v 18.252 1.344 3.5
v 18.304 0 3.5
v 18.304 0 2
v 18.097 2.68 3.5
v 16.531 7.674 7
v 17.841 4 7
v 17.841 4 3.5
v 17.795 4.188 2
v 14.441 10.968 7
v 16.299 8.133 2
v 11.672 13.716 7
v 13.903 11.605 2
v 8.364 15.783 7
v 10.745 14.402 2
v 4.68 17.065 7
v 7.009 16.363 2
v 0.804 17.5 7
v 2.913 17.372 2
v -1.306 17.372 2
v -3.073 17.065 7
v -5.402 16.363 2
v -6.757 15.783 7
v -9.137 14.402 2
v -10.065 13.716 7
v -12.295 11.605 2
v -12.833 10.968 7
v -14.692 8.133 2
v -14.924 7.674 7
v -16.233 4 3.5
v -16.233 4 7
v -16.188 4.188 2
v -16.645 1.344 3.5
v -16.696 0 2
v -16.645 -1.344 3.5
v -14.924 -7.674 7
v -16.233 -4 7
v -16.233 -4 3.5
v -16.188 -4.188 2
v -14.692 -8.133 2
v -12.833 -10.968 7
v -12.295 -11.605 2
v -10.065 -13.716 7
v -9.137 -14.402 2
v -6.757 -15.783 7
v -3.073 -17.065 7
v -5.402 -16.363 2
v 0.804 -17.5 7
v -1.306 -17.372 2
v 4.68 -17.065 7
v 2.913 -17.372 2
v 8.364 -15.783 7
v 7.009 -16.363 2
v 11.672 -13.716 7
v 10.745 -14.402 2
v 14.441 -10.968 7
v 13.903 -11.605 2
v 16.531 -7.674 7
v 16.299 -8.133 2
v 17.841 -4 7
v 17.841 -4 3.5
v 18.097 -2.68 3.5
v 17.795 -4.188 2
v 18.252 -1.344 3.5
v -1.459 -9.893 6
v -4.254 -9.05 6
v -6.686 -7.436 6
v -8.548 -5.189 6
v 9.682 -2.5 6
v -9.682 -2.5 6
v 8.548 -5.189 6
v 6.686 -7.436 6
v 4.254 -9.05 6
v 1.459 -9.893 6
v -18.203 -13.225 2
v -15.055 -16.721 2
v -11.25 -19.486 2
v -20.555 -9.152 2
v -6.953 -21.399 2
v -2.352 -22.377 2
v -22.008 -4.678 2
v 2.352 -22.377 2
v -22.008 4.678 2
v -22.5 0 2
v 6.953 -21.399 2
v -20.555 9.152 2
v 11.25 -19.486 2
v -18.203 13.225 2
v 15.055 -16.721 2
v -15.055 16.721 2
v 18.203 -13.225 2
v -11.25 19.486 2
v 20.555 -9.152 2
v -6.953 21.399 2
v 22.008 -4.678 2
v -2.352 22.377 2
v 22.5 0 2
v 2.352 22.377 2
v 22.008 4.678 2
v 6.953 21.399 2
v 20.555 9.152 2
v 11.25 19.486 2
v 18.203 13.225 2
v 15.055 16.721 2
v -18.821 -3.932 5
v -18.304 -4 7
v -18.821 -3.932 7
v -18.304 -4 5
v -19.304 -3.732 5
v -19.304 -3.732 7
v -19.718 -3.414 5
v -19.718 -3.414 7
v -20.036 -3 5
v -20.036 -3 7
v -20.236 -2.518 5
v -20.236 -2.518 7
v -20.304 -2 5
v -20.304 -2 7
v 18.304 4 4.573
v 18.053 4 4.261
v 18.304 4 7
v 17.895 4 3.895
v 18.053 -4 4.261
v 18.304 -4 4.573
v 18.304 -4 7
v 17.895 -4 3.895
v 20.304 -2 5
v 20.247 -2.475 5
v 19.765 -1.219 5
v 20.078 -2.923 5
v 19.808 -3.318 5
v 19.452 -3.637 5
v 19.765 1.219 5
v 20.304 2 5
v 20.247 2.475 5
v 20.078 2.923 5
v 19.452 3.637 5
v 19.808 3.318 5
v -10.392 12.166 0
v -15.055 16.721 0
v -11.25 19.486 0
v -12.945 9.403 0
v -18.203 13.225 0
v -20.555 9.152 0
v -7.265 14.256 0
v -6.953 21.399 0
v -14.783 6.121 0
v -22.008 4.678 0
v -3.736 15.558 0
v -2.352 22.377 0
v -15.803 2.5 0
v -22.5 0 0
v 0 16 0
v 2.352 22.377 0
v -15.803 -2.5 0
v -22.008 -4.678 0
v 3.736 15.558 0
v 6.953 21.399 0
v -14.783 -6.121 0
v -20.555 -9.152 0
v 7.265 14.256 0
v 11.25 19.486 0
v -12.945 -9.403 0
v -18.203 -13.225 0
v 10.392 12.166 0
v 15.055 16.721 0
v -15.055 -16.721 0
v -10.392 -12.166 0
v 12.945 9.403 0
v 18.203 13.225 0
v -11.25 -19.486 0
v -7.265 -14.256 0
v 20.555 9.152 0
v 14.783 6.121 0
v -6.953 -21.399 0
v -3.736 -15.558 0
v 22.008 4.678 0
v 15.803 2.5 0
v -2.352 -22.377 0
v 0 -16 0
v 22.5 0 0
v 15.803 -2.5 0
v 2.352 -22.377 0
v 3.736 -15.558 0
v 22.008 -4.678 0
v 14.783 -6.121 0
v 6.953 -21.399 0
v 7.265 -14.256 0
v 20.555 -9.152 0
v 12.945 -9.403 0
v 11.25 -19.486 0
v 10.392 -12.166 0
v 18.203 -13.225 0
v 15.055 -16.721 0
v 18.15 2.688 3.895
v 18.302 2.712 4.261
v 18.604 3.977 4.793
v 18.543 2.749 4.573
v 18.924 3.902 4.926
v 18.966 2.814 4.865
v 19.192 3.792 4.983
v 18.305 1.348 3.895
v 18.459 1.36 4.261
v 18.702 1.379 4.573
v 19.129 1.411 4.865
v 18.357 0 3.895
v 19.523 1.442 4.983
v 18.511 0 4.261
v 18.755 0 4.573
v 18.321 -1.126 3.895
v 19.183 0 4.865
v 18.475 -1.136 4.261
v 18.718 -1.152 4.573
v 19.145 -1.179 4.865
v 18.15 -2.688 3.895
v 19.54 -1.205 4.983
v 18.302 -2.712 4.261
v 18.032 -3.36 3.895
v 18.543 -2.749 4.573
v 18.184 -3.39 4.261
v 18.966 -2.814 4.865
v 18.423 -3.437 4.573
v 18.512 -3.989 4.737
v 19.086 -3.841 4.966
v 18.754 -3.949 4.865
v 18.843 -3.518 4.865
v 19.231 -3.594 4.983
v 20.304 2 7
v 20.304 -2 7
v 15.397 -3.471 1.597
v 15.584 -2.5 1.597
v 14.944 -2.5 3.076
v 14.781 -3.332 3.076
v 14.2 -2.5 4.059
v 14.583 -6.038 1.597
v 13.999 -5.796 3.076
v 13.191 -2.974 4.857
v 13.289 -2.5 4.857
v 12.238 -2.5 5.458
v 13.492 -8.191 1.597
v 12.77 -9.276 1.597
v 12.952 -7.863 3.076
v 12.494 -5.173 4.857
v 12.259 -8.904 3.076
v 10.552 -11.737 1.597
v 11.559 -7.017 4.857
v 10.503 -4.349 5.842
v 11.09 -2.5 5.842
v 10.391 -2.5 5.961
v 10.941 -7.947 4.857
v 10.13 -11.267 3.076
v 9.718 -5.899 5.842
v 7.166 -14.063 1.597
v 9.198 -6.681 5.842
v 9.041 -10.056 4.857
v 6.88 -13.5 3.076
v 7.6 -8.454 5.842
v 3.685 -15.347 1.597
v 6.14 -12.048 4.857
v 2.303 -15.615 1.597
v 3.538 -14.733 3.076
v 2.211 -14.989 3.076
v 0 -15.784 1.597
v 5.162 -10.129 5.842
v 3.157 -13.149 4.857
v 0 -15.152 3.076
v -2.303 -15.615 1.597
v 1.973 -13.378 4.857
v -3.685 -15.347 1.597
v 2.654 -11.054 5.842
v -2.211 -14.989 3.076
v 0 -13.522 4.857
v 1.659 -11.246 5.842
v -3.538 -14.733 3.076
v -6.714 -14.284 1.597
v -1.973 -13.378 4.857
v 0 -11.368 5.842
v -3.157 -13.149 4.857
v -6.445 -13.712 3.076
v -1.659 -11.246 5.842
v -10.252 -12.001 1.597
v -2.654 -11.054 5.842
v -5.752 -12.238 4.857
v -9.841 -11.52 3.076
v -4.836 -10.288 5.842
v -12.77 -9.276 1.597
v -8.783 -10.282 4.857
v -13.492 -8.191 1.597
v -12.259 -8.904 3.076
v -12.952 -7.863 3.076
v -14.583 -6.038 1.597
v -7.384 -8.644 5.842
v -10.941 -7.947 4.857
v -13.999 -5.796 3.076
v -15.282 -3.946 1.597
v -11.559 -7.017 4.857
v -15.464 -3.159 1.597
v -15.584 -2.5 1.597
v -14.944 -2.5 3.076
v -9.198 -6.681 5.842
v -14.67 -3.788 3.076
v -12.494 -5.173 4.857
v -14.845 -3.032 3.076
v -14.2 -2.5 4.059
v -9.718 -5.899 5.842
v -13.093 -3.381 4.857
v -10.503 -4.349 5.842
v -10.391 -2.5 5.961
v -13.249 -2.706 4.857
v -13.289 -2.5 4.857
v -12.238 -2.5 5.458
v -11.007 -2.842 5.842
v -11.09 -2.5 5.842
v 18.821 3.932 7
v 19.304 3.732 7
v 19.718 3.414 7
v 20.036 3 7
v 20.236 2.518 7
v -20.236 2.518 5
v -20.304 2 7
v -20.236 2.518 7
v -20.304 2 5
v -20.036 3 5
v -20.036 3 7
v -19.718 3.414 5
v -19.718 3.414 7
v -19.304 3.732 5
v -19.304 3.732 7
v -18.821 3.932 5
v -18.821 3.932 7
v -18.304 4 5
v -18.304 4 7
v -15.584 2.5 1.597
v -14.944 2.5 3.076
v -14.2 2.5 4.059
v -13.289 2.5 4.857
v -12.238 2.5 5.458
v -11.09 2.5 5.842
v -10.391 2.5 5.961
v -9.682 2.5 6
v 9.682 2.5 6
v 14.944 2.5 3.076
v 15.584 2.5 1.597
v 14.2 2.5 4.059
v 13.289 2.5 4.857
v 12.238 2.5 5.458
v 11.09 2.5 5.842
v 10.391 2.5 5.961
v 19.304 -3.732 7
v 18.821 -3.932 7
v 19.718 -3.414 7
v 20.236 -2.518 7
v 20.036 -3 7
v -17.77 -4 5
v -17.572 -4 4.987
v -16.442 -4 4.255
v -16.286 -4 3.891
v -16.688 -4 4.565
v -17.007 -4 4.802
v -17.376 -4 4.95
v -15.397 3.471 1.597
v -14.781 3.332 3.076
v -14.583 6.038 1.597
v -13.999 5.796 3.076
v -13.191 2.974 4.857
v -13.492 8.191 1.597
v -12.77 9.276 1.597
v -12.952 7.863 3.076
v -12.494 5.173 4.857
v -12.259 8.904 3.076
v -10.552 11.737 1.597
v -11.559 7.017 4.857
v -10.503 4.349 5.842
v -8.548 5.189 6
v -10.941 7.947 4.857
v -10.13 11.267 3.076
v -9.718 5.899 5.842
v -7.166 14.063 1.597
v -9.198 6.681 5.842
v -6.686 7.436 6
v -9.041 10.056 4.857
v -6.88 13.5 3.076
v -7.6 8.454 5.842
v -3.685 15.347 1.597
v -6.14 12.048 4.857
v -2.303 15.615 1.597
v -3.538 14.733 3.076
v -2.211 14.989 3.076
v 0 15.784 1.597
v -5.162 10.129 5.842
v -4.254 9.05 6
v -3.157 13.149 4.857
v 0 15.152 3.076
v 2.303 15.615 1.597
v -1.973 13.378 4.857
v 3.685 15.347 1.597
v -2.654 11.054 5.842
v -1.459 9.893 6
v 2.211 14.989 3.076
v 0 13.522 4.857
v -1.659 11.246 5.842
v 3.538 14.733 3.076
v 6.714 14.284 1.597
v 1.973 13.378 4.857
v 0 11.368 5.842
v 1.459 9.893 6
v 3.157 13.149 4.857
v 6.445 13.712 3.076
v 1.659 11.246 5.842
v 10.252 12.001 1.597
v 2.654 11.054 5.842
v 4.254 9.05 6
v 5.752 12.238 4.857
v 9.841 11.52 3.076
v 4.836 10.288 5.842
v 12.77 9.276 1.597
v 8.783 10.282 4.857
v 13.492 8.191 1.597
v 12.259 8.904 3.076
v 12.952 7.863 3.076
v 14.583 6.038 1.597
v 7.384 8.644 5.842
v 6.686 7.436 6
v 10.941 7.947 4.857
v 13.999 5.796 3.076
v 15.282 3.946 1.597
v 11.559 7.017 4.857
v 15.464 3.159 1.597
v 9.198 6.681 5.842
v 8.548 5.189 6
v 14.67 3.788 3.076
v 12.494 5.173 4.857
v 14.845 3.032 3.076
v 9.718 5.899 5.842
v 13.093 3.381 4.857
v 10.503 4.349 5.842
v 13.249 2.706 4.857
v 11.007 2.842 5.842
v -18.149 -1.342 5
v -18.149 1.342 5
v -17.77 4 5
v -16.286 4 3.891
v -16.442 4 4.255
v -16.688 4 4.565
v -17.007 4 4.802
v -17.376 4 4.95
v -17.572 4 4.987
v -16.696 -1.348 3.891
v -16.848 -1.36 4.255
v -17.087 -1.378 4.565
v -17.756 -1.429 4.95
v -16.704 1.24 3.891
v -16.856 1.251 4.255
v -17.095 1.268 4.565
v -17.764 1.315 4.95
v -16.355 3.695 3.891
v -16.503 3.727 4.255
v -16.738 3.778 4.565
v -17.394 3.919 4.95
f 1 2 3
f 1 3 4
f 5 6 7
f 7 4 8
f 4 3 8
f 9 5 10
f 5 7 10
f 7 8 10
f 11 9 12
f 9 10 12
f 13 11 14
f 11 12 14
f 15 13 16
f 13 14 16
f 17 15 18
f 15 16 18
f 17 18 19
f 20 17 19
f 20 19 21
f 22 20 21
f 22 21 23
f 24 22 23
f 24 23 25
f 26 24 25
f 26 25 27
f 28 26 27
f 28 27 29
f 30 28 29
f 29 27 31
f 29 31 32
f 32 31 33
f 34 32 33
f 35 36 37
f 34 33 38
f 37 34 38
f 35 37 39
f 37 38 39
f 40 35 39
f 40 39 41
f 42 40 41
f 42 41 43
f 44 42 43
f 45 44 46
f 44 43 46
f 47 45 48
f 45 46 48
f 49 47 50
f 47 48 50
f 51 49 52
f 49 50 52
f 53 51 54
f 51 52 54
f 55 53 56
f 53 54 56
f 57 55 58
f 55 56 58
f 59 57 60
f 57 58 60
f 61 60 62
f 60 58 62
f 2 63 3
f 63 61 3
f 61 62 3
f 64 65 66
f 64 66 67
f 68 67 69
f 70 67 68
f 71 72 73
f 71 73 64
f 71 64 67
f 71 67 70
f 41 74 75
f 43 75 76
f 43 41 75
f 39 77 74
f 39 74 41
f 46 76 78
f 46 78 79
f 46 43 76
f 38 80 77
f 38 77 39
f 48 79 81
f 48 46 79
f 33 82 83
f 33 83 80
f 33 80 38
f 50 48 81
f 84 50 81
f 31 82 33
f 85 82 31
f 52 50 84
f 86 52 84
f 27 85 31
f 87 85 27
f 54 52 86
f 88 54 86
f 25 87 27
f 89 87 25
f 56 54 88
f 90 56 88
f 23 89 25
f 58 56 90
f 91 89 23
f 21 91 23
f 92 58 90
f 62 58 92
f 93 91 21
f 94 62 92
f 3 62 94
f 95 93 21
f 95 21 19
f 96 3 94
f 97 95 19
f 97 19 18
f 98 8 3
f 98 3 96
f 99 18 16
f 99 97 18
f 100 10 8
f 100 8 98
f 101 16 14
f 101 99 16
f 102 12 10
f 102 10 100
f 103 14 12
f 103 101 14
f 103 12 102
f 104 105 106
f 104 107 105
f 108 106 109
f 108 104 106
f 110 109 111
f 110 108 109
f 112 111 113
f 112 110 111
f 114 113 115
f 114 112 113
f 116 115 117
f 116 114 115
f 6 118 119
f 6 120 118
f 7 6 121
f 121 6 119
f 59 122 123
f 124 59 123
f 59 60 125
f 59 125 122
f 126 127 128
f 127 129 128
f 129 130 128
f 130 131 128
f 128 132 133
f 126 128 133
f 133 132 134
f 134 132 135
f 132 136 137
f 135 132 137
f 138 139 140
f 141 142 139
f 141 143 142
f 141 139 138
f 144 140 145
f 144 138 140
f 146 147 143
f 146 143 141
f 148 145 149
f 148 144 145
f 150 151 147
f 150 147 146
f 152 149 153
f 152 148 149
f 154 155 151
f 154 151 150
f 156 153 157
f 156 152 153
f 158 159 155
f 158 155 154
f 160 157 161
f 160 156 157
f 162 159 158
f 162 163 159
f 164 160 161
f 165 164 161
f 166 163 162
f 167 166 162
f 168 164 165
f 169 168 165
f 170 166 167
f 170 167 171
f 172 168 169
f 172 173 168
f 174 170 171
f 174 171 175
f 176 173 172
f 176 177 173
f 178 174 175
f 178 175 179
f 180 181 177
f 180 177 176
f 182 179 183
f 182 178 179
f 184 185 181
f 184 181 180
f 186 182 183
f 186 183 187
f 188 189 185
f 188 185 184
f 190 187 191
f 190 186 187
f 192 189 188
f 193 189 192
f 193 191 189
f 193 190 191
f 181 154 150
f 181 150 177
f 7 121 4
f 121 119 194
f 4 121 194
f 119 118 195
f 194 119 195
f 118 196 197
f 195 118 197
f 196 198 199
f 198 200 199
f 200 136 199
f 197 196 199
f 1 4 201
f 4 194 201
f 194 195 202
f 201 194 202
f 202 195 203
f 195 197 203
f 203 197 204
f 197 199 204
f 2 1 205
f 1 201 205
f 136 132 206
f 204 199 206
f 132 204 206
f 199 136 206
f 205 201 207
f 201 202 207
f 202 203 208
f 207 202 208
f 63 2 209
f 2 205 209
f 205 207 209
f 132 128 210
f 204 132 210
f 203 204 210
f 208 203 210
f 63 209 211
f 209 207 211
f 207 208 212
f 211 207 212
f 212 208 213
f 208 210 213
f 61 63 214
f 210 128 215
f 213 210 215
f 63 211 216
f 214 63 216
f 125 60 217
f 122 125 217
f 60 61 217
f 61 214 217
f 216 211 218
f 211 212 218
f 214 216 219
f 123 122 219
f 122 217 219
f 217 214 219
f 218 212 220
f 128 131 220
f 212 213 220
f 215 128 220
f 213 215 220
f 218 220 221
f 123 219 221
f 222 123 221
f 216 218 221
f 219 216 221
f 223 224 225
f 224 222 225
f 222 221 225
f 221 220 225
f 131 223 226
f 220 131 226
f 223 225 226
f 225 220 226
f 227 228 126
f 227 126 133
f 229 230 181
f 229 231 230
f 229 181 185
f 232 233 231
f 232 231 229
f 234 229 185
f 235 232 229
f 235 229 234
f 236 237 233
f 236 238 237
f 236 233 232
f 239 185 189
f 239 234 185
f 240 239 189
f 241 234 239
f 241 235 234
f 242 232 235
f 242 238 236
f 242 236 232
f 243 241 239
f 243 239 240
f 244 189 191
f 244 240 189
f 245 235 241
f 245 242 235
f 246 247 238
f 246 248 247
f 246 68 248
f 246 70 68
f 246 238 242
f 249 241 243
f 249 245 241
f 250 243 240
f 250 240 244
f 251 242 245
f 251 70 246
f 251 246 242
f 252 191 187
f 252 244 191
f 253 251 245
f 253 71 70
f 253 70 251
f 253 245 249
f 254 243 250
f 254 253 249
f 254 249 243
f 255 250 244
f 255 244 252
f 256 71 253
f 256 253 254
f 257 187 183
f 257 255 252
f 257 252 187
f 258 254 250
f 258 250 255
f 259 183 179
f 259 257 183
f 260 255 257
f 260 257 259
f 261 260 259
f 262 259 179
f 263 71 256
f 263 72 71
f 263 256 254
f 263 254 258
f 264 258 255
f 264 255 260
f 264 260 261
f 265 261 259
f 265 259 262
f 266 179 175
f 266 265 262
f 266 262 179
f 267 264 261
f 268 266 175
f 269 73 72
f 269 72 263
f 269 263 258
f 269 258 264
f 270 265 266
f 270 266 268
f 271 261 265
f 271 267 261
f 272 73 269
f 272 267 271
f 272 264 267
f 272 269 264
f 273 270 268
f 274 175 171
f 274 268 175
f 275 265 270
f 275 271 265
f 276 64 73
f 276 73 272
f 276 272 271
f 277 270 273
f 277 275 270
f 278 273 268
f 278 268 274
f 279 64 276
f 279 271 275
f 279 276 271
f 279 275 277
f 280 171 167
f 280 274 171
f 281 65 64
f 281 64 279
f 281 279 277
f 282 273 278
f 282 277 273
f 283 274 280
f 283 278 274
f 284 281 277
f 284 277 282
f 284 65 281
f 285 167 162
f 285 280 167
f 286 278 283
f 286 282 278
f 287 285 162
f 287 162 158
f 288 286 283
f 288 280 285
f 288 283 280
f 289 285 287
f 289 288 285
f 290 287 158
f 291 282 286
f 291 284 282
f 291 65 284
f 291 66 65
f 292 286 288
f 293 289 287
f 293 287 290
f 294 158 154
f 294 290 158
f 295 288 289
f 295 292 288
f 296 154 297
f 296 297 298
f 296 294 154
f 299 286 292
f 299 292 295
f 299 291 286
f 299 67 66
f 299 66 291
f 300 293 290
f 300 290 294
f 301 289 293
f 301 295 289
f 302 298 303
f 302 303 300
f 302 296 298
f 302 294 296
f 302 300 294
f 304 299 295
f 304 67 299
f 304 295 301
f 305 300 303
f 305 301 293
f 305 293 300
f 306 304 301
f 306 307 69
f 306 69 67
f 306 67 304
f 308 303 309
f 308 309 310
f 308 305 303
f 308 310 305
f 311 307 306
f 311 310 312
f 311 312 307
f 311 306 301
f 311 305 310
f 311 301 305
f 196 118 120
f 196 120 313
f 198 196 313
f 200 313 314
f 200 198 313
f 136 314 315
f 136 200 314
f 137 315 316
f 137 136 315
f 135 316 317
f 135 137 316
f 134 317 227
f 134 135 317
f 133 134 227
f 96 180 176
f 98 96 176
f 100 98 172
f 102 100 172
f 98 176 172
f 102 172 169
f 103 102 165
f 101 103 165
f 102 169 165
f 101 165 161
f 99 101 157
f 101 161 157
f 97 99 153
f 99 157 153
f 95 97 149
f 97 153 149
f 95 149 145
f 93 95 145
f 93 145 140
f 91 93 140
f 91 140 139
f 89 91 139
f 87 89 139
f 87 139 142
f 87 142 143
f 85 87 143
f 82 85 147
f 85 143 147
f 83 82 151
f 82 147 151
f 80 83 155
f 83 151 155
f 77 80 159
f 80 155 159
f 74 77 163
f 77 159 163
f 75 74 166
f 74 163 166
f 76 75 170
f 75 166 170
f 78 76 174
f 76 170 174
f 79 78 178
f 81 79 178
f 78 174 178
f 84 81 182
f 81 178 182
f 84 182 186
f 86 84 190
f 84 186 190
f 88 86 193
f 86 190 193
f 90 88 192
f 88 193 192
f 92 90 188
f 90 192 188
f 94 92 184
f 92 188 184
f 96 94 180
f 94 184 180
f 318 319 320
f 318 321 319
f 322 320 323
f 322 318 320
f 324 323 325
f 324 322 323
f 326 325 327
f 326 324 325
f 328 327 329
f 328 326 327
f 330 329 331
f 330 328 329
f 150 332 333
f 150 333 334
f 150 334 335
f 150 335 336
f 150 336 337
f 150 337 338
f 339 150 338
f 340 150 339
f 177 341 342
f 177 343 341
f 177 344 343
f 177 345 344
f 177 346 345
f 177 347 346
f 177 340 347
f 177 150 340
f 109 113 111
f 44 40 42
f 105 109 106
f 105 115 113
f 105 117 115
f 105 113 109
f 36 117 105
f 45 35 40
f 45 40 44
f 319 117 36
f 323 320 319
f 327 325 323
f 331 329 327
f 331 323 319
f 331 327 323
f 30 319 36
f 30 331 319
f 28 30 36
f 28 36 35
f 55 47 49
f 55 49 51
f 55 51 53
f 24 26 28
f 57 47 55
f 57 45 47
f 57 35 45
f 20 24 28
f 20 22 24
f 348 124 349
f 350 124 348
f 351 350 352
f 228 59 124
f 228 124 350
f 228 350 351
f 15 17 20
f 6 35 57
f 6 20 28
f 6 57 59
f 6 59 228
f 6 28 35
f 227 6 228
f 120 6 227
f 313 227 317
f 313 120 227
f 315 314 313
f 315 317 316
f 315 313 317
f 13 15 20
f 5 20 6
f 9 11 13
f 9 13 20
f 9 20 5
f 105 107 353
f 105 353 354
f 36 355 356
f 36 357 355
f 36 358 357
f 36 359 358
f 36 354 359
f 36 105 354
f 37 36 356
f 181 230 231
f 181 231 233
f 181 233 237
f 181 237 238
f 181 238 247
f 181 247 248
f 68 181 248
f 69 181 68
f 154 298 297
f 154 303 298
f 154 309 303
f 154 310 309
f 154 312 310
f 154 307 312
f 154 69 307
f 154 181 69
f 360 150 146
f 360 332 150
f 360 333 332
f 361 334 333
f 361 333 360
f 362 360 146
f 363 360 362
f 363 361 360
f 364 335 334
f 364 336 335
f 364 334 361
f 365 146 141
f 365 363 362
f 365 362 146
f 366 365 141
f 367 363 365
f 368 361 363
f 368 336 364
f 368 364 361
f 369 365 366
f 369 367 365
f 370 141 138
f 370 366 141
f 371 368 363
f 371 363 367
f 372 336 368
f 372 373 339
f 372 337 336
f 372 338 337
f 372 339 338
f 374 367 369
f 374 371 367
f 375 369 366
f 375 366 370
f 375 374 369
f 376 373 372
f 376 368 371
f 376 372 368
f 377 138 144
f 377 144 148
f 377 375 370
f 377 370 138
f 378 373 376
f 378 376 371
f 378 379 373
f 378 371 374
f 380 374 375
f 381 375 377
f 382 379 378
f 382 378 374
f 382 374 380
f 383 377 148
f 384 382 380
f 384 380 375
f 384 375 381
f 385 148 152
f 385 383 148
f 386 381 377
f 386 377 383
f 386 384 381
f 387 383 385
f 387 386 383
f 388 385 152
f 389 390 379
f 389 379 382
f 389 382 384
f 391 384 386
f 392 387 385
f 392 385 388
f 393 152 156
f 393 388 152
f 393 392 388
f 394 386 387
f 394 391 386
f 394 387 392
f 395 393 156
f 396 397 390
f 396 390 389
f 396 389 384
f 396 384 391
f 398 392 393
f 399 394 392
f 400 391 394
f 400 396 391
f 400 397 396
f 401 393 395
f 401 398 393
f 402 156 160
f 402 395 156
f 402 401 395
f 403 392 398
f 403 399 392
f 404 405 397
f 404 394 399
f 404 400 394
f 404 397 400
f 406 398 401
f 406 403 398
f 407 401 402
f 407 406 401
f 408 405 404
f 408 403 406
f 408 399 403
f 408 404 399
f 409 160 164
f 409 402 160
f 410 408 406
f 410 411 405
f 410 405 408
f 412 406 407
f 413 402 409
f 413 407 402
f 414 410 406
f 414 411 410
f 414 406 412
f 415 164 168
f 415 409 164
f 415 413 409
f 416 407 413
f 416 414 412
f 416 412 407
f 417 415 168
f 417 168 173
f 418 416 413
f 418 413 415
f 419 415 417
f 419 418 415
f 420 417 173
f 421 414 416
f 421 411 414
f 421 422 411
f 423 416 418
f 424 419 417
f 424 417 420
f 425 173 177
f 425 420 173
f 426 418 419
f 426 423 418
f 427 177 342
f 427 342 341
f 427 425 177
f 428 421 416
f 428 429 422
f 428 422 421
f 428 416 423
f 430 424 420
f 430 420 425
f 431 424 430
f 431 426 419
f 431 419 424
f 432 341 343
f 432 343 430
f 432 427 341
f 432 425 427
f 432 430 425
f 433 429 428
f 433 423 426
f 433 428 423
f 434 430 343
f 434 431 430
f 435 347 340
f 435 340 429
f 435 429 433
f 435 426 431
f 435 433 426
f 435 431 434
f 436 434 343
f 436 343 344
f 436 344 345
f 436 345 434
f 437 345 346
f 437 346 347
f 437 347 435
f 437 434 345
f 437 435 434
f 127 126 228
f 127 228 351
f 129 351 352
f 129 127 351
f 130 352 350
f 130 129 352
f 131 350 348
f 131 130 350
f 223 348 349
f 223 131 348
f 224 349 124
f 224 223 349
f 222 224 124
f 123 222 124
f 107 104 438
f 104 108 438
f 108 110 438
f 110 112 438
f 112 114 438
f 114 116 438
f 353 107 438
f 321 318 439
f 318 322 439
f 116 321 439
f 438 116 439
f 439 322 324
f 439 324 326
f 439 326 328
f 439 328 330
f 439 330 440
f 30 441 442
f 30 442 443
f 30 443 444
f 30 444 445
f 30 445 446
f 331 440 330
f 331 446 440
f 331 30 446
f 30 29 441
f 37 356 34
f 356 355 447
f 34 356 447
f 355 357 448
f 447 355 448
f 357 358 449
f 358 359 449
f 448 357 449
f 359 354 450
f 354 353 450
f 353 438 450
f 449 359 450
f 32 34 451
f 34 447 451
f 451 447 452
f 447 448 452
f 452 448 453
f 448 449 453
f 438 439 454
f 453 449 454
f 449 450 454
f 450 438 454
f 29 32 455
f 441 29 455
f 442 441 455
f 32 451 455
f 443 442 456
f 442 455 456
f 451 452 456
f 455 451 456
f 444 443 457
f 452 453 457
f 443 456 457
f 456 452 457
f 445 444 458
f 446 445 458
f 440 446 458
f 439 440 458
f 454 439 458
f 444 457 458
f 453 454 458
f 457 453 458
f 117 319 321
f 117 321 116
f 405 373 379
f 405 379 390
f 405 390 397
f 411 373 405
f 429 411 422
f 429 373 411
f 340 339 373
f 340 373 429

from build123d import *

# Parameters (mm, degrees)
F0_R     = 22.5
F1_DEPTH = 2
F2_R     = 17.5
F3_DEPTH = 5
F5_DEPTH = 2
F6_R     = 1.5
F7_R     = 2
F8_R     = 16
F9_DEPTH = 6
F10_R    = 5.99999


# Not quite as in the source:
# - a fillet or chamfer is up to 0.001 mm smaller than in the source, because OpenCascade refuses the exact size


with BuildPart() as f1:
    # F0 (on Top) → F1 (new body)
    with BuildSketch(Plane.XY):
        Circle(F0_R)
    extrude(amount=F1_DEPTH)

    # F2 (on face) → F3 (join)
    with BuildSketch(Plane.XY.offset(2)):
        with Locations((0.8037949441, 0)):
            Circle(F2_R)
    extrude(amount=F3_DEPTH)

    # F4 (on face) → F5 (join)
    with BuildSketch(Plane.XY.offset(7)):
        with BuildLine():
            Line((-20.3037949441, -4), (-16.2329300933, -4))
            ThreePointArc((-16.2329300933, -4), (-16.6962050559, 0), (-16.2329300933, 4))
            Line((-16.2329300933, 4), (-20.3037949441, 4))
            Line((-20.3037949441, 4), (-20.3037949441, -4))
        make_face()
        with BuildLine():
            Line((-16.2329300933, -4), (17.8405199815, -4))
            ThreePointArc((17.8405199815, -4), (18.1875903893, -2.0133692962), (18.3037949441, 0))
            ThreePointArc((18.3037949441, 0), (18.1875903893, 2.0133692962), (17.8405199815, 4))
            Line((17.8405199815, 4), (-16.2329300933, 4))
            ThreePointArc((-16.2329300933, 4), (-16.6962050559, 0), (-16.2329300933, -4))
        make_face()
        with BuildLine():
            Line((17.8405199815, -4), (20.3037949441, -4))
            Line((20.3037949441, -4), (20.3037949441, 4))
            Line((20.3037949441, 4), (17.8405199815, 4))
            ThreePointArc((17.8405199815, 4), (18.1875903893, 2.0133692962), (18.3037949441, 0))
            ThreePointArc((18.3037949441, 0), (18.1875903893, -2.0133692962), (17.8405199815, -4))
        make_face()
    extrude(amount=-F5_DEPTH)

    # F6
    f6_edges = [f1.edges().sort_by_distance(p)[0] for p in [
        (18.18759, -2.013369, 5),
        (-16.696205, 0, 5),
        (18.18759, 2.013369, 5),
    ]]
    fillet(f6_edges, radius=F6_R)

    # F7
    f7_edges = [f1.edges().sort_by_distance(p)[0] for p in [
        (-20.303795, 4, 6),
        (-20.303795, -4, 6),
        (20.303795, -4, 6),
        (20.303795, 4, 6),
    ]]
    fillet(f7_edges, radius=F7_R)

    # F8 (on face) → F9 (cut)
    with BuildSketch(Plane(origin=(0, 0, 0), x_dir=(1, 0, 0), z_dir=(0, 0, -1))):
        Circle(F8_R)
    extrude(amount=-F9_DEPTH, mode=Mode.SUBTRACT)

    # F10 (radius 6 in the source; OpenCascade refuses exactly that, so slightly less here)
    f10_edges = [f1.edges().sort_by_distance(p)[0] for p in [
        (-16, 0, 6),
    ]]
    fillet(f10_edges, radius=F10_R)

    # F11 (on face) → F12 (join, up to the next surface of F1)
    with BuildSketch(Plane(origin=(0, 0, 0), x_dir=(1, 0, 0), z_dir=(0, 0, -1))):
        with BuildLine():
            Line((15.8034806293, 2.5), (-15.8034806293, 2.5))
            ThreePointArc((-15.8034806293, 2.5), (-16, 0), (-15.8034806293, -2.5))
            Line((-15.8034806293, -2.5), (15.8034806293, -2.5))
            ThreePointArc((15.8034806293, -2.5), (15.9507944954, -1.2538560387), (16, 0))
            ThreePointArc((16, 0), (15.9507944954, 1.2538560387), (15.8034806293, 2.5))
        make_face()
    extrude(until=Until.NEXT, dir=(0, 0, 1))


solid = f1.part
